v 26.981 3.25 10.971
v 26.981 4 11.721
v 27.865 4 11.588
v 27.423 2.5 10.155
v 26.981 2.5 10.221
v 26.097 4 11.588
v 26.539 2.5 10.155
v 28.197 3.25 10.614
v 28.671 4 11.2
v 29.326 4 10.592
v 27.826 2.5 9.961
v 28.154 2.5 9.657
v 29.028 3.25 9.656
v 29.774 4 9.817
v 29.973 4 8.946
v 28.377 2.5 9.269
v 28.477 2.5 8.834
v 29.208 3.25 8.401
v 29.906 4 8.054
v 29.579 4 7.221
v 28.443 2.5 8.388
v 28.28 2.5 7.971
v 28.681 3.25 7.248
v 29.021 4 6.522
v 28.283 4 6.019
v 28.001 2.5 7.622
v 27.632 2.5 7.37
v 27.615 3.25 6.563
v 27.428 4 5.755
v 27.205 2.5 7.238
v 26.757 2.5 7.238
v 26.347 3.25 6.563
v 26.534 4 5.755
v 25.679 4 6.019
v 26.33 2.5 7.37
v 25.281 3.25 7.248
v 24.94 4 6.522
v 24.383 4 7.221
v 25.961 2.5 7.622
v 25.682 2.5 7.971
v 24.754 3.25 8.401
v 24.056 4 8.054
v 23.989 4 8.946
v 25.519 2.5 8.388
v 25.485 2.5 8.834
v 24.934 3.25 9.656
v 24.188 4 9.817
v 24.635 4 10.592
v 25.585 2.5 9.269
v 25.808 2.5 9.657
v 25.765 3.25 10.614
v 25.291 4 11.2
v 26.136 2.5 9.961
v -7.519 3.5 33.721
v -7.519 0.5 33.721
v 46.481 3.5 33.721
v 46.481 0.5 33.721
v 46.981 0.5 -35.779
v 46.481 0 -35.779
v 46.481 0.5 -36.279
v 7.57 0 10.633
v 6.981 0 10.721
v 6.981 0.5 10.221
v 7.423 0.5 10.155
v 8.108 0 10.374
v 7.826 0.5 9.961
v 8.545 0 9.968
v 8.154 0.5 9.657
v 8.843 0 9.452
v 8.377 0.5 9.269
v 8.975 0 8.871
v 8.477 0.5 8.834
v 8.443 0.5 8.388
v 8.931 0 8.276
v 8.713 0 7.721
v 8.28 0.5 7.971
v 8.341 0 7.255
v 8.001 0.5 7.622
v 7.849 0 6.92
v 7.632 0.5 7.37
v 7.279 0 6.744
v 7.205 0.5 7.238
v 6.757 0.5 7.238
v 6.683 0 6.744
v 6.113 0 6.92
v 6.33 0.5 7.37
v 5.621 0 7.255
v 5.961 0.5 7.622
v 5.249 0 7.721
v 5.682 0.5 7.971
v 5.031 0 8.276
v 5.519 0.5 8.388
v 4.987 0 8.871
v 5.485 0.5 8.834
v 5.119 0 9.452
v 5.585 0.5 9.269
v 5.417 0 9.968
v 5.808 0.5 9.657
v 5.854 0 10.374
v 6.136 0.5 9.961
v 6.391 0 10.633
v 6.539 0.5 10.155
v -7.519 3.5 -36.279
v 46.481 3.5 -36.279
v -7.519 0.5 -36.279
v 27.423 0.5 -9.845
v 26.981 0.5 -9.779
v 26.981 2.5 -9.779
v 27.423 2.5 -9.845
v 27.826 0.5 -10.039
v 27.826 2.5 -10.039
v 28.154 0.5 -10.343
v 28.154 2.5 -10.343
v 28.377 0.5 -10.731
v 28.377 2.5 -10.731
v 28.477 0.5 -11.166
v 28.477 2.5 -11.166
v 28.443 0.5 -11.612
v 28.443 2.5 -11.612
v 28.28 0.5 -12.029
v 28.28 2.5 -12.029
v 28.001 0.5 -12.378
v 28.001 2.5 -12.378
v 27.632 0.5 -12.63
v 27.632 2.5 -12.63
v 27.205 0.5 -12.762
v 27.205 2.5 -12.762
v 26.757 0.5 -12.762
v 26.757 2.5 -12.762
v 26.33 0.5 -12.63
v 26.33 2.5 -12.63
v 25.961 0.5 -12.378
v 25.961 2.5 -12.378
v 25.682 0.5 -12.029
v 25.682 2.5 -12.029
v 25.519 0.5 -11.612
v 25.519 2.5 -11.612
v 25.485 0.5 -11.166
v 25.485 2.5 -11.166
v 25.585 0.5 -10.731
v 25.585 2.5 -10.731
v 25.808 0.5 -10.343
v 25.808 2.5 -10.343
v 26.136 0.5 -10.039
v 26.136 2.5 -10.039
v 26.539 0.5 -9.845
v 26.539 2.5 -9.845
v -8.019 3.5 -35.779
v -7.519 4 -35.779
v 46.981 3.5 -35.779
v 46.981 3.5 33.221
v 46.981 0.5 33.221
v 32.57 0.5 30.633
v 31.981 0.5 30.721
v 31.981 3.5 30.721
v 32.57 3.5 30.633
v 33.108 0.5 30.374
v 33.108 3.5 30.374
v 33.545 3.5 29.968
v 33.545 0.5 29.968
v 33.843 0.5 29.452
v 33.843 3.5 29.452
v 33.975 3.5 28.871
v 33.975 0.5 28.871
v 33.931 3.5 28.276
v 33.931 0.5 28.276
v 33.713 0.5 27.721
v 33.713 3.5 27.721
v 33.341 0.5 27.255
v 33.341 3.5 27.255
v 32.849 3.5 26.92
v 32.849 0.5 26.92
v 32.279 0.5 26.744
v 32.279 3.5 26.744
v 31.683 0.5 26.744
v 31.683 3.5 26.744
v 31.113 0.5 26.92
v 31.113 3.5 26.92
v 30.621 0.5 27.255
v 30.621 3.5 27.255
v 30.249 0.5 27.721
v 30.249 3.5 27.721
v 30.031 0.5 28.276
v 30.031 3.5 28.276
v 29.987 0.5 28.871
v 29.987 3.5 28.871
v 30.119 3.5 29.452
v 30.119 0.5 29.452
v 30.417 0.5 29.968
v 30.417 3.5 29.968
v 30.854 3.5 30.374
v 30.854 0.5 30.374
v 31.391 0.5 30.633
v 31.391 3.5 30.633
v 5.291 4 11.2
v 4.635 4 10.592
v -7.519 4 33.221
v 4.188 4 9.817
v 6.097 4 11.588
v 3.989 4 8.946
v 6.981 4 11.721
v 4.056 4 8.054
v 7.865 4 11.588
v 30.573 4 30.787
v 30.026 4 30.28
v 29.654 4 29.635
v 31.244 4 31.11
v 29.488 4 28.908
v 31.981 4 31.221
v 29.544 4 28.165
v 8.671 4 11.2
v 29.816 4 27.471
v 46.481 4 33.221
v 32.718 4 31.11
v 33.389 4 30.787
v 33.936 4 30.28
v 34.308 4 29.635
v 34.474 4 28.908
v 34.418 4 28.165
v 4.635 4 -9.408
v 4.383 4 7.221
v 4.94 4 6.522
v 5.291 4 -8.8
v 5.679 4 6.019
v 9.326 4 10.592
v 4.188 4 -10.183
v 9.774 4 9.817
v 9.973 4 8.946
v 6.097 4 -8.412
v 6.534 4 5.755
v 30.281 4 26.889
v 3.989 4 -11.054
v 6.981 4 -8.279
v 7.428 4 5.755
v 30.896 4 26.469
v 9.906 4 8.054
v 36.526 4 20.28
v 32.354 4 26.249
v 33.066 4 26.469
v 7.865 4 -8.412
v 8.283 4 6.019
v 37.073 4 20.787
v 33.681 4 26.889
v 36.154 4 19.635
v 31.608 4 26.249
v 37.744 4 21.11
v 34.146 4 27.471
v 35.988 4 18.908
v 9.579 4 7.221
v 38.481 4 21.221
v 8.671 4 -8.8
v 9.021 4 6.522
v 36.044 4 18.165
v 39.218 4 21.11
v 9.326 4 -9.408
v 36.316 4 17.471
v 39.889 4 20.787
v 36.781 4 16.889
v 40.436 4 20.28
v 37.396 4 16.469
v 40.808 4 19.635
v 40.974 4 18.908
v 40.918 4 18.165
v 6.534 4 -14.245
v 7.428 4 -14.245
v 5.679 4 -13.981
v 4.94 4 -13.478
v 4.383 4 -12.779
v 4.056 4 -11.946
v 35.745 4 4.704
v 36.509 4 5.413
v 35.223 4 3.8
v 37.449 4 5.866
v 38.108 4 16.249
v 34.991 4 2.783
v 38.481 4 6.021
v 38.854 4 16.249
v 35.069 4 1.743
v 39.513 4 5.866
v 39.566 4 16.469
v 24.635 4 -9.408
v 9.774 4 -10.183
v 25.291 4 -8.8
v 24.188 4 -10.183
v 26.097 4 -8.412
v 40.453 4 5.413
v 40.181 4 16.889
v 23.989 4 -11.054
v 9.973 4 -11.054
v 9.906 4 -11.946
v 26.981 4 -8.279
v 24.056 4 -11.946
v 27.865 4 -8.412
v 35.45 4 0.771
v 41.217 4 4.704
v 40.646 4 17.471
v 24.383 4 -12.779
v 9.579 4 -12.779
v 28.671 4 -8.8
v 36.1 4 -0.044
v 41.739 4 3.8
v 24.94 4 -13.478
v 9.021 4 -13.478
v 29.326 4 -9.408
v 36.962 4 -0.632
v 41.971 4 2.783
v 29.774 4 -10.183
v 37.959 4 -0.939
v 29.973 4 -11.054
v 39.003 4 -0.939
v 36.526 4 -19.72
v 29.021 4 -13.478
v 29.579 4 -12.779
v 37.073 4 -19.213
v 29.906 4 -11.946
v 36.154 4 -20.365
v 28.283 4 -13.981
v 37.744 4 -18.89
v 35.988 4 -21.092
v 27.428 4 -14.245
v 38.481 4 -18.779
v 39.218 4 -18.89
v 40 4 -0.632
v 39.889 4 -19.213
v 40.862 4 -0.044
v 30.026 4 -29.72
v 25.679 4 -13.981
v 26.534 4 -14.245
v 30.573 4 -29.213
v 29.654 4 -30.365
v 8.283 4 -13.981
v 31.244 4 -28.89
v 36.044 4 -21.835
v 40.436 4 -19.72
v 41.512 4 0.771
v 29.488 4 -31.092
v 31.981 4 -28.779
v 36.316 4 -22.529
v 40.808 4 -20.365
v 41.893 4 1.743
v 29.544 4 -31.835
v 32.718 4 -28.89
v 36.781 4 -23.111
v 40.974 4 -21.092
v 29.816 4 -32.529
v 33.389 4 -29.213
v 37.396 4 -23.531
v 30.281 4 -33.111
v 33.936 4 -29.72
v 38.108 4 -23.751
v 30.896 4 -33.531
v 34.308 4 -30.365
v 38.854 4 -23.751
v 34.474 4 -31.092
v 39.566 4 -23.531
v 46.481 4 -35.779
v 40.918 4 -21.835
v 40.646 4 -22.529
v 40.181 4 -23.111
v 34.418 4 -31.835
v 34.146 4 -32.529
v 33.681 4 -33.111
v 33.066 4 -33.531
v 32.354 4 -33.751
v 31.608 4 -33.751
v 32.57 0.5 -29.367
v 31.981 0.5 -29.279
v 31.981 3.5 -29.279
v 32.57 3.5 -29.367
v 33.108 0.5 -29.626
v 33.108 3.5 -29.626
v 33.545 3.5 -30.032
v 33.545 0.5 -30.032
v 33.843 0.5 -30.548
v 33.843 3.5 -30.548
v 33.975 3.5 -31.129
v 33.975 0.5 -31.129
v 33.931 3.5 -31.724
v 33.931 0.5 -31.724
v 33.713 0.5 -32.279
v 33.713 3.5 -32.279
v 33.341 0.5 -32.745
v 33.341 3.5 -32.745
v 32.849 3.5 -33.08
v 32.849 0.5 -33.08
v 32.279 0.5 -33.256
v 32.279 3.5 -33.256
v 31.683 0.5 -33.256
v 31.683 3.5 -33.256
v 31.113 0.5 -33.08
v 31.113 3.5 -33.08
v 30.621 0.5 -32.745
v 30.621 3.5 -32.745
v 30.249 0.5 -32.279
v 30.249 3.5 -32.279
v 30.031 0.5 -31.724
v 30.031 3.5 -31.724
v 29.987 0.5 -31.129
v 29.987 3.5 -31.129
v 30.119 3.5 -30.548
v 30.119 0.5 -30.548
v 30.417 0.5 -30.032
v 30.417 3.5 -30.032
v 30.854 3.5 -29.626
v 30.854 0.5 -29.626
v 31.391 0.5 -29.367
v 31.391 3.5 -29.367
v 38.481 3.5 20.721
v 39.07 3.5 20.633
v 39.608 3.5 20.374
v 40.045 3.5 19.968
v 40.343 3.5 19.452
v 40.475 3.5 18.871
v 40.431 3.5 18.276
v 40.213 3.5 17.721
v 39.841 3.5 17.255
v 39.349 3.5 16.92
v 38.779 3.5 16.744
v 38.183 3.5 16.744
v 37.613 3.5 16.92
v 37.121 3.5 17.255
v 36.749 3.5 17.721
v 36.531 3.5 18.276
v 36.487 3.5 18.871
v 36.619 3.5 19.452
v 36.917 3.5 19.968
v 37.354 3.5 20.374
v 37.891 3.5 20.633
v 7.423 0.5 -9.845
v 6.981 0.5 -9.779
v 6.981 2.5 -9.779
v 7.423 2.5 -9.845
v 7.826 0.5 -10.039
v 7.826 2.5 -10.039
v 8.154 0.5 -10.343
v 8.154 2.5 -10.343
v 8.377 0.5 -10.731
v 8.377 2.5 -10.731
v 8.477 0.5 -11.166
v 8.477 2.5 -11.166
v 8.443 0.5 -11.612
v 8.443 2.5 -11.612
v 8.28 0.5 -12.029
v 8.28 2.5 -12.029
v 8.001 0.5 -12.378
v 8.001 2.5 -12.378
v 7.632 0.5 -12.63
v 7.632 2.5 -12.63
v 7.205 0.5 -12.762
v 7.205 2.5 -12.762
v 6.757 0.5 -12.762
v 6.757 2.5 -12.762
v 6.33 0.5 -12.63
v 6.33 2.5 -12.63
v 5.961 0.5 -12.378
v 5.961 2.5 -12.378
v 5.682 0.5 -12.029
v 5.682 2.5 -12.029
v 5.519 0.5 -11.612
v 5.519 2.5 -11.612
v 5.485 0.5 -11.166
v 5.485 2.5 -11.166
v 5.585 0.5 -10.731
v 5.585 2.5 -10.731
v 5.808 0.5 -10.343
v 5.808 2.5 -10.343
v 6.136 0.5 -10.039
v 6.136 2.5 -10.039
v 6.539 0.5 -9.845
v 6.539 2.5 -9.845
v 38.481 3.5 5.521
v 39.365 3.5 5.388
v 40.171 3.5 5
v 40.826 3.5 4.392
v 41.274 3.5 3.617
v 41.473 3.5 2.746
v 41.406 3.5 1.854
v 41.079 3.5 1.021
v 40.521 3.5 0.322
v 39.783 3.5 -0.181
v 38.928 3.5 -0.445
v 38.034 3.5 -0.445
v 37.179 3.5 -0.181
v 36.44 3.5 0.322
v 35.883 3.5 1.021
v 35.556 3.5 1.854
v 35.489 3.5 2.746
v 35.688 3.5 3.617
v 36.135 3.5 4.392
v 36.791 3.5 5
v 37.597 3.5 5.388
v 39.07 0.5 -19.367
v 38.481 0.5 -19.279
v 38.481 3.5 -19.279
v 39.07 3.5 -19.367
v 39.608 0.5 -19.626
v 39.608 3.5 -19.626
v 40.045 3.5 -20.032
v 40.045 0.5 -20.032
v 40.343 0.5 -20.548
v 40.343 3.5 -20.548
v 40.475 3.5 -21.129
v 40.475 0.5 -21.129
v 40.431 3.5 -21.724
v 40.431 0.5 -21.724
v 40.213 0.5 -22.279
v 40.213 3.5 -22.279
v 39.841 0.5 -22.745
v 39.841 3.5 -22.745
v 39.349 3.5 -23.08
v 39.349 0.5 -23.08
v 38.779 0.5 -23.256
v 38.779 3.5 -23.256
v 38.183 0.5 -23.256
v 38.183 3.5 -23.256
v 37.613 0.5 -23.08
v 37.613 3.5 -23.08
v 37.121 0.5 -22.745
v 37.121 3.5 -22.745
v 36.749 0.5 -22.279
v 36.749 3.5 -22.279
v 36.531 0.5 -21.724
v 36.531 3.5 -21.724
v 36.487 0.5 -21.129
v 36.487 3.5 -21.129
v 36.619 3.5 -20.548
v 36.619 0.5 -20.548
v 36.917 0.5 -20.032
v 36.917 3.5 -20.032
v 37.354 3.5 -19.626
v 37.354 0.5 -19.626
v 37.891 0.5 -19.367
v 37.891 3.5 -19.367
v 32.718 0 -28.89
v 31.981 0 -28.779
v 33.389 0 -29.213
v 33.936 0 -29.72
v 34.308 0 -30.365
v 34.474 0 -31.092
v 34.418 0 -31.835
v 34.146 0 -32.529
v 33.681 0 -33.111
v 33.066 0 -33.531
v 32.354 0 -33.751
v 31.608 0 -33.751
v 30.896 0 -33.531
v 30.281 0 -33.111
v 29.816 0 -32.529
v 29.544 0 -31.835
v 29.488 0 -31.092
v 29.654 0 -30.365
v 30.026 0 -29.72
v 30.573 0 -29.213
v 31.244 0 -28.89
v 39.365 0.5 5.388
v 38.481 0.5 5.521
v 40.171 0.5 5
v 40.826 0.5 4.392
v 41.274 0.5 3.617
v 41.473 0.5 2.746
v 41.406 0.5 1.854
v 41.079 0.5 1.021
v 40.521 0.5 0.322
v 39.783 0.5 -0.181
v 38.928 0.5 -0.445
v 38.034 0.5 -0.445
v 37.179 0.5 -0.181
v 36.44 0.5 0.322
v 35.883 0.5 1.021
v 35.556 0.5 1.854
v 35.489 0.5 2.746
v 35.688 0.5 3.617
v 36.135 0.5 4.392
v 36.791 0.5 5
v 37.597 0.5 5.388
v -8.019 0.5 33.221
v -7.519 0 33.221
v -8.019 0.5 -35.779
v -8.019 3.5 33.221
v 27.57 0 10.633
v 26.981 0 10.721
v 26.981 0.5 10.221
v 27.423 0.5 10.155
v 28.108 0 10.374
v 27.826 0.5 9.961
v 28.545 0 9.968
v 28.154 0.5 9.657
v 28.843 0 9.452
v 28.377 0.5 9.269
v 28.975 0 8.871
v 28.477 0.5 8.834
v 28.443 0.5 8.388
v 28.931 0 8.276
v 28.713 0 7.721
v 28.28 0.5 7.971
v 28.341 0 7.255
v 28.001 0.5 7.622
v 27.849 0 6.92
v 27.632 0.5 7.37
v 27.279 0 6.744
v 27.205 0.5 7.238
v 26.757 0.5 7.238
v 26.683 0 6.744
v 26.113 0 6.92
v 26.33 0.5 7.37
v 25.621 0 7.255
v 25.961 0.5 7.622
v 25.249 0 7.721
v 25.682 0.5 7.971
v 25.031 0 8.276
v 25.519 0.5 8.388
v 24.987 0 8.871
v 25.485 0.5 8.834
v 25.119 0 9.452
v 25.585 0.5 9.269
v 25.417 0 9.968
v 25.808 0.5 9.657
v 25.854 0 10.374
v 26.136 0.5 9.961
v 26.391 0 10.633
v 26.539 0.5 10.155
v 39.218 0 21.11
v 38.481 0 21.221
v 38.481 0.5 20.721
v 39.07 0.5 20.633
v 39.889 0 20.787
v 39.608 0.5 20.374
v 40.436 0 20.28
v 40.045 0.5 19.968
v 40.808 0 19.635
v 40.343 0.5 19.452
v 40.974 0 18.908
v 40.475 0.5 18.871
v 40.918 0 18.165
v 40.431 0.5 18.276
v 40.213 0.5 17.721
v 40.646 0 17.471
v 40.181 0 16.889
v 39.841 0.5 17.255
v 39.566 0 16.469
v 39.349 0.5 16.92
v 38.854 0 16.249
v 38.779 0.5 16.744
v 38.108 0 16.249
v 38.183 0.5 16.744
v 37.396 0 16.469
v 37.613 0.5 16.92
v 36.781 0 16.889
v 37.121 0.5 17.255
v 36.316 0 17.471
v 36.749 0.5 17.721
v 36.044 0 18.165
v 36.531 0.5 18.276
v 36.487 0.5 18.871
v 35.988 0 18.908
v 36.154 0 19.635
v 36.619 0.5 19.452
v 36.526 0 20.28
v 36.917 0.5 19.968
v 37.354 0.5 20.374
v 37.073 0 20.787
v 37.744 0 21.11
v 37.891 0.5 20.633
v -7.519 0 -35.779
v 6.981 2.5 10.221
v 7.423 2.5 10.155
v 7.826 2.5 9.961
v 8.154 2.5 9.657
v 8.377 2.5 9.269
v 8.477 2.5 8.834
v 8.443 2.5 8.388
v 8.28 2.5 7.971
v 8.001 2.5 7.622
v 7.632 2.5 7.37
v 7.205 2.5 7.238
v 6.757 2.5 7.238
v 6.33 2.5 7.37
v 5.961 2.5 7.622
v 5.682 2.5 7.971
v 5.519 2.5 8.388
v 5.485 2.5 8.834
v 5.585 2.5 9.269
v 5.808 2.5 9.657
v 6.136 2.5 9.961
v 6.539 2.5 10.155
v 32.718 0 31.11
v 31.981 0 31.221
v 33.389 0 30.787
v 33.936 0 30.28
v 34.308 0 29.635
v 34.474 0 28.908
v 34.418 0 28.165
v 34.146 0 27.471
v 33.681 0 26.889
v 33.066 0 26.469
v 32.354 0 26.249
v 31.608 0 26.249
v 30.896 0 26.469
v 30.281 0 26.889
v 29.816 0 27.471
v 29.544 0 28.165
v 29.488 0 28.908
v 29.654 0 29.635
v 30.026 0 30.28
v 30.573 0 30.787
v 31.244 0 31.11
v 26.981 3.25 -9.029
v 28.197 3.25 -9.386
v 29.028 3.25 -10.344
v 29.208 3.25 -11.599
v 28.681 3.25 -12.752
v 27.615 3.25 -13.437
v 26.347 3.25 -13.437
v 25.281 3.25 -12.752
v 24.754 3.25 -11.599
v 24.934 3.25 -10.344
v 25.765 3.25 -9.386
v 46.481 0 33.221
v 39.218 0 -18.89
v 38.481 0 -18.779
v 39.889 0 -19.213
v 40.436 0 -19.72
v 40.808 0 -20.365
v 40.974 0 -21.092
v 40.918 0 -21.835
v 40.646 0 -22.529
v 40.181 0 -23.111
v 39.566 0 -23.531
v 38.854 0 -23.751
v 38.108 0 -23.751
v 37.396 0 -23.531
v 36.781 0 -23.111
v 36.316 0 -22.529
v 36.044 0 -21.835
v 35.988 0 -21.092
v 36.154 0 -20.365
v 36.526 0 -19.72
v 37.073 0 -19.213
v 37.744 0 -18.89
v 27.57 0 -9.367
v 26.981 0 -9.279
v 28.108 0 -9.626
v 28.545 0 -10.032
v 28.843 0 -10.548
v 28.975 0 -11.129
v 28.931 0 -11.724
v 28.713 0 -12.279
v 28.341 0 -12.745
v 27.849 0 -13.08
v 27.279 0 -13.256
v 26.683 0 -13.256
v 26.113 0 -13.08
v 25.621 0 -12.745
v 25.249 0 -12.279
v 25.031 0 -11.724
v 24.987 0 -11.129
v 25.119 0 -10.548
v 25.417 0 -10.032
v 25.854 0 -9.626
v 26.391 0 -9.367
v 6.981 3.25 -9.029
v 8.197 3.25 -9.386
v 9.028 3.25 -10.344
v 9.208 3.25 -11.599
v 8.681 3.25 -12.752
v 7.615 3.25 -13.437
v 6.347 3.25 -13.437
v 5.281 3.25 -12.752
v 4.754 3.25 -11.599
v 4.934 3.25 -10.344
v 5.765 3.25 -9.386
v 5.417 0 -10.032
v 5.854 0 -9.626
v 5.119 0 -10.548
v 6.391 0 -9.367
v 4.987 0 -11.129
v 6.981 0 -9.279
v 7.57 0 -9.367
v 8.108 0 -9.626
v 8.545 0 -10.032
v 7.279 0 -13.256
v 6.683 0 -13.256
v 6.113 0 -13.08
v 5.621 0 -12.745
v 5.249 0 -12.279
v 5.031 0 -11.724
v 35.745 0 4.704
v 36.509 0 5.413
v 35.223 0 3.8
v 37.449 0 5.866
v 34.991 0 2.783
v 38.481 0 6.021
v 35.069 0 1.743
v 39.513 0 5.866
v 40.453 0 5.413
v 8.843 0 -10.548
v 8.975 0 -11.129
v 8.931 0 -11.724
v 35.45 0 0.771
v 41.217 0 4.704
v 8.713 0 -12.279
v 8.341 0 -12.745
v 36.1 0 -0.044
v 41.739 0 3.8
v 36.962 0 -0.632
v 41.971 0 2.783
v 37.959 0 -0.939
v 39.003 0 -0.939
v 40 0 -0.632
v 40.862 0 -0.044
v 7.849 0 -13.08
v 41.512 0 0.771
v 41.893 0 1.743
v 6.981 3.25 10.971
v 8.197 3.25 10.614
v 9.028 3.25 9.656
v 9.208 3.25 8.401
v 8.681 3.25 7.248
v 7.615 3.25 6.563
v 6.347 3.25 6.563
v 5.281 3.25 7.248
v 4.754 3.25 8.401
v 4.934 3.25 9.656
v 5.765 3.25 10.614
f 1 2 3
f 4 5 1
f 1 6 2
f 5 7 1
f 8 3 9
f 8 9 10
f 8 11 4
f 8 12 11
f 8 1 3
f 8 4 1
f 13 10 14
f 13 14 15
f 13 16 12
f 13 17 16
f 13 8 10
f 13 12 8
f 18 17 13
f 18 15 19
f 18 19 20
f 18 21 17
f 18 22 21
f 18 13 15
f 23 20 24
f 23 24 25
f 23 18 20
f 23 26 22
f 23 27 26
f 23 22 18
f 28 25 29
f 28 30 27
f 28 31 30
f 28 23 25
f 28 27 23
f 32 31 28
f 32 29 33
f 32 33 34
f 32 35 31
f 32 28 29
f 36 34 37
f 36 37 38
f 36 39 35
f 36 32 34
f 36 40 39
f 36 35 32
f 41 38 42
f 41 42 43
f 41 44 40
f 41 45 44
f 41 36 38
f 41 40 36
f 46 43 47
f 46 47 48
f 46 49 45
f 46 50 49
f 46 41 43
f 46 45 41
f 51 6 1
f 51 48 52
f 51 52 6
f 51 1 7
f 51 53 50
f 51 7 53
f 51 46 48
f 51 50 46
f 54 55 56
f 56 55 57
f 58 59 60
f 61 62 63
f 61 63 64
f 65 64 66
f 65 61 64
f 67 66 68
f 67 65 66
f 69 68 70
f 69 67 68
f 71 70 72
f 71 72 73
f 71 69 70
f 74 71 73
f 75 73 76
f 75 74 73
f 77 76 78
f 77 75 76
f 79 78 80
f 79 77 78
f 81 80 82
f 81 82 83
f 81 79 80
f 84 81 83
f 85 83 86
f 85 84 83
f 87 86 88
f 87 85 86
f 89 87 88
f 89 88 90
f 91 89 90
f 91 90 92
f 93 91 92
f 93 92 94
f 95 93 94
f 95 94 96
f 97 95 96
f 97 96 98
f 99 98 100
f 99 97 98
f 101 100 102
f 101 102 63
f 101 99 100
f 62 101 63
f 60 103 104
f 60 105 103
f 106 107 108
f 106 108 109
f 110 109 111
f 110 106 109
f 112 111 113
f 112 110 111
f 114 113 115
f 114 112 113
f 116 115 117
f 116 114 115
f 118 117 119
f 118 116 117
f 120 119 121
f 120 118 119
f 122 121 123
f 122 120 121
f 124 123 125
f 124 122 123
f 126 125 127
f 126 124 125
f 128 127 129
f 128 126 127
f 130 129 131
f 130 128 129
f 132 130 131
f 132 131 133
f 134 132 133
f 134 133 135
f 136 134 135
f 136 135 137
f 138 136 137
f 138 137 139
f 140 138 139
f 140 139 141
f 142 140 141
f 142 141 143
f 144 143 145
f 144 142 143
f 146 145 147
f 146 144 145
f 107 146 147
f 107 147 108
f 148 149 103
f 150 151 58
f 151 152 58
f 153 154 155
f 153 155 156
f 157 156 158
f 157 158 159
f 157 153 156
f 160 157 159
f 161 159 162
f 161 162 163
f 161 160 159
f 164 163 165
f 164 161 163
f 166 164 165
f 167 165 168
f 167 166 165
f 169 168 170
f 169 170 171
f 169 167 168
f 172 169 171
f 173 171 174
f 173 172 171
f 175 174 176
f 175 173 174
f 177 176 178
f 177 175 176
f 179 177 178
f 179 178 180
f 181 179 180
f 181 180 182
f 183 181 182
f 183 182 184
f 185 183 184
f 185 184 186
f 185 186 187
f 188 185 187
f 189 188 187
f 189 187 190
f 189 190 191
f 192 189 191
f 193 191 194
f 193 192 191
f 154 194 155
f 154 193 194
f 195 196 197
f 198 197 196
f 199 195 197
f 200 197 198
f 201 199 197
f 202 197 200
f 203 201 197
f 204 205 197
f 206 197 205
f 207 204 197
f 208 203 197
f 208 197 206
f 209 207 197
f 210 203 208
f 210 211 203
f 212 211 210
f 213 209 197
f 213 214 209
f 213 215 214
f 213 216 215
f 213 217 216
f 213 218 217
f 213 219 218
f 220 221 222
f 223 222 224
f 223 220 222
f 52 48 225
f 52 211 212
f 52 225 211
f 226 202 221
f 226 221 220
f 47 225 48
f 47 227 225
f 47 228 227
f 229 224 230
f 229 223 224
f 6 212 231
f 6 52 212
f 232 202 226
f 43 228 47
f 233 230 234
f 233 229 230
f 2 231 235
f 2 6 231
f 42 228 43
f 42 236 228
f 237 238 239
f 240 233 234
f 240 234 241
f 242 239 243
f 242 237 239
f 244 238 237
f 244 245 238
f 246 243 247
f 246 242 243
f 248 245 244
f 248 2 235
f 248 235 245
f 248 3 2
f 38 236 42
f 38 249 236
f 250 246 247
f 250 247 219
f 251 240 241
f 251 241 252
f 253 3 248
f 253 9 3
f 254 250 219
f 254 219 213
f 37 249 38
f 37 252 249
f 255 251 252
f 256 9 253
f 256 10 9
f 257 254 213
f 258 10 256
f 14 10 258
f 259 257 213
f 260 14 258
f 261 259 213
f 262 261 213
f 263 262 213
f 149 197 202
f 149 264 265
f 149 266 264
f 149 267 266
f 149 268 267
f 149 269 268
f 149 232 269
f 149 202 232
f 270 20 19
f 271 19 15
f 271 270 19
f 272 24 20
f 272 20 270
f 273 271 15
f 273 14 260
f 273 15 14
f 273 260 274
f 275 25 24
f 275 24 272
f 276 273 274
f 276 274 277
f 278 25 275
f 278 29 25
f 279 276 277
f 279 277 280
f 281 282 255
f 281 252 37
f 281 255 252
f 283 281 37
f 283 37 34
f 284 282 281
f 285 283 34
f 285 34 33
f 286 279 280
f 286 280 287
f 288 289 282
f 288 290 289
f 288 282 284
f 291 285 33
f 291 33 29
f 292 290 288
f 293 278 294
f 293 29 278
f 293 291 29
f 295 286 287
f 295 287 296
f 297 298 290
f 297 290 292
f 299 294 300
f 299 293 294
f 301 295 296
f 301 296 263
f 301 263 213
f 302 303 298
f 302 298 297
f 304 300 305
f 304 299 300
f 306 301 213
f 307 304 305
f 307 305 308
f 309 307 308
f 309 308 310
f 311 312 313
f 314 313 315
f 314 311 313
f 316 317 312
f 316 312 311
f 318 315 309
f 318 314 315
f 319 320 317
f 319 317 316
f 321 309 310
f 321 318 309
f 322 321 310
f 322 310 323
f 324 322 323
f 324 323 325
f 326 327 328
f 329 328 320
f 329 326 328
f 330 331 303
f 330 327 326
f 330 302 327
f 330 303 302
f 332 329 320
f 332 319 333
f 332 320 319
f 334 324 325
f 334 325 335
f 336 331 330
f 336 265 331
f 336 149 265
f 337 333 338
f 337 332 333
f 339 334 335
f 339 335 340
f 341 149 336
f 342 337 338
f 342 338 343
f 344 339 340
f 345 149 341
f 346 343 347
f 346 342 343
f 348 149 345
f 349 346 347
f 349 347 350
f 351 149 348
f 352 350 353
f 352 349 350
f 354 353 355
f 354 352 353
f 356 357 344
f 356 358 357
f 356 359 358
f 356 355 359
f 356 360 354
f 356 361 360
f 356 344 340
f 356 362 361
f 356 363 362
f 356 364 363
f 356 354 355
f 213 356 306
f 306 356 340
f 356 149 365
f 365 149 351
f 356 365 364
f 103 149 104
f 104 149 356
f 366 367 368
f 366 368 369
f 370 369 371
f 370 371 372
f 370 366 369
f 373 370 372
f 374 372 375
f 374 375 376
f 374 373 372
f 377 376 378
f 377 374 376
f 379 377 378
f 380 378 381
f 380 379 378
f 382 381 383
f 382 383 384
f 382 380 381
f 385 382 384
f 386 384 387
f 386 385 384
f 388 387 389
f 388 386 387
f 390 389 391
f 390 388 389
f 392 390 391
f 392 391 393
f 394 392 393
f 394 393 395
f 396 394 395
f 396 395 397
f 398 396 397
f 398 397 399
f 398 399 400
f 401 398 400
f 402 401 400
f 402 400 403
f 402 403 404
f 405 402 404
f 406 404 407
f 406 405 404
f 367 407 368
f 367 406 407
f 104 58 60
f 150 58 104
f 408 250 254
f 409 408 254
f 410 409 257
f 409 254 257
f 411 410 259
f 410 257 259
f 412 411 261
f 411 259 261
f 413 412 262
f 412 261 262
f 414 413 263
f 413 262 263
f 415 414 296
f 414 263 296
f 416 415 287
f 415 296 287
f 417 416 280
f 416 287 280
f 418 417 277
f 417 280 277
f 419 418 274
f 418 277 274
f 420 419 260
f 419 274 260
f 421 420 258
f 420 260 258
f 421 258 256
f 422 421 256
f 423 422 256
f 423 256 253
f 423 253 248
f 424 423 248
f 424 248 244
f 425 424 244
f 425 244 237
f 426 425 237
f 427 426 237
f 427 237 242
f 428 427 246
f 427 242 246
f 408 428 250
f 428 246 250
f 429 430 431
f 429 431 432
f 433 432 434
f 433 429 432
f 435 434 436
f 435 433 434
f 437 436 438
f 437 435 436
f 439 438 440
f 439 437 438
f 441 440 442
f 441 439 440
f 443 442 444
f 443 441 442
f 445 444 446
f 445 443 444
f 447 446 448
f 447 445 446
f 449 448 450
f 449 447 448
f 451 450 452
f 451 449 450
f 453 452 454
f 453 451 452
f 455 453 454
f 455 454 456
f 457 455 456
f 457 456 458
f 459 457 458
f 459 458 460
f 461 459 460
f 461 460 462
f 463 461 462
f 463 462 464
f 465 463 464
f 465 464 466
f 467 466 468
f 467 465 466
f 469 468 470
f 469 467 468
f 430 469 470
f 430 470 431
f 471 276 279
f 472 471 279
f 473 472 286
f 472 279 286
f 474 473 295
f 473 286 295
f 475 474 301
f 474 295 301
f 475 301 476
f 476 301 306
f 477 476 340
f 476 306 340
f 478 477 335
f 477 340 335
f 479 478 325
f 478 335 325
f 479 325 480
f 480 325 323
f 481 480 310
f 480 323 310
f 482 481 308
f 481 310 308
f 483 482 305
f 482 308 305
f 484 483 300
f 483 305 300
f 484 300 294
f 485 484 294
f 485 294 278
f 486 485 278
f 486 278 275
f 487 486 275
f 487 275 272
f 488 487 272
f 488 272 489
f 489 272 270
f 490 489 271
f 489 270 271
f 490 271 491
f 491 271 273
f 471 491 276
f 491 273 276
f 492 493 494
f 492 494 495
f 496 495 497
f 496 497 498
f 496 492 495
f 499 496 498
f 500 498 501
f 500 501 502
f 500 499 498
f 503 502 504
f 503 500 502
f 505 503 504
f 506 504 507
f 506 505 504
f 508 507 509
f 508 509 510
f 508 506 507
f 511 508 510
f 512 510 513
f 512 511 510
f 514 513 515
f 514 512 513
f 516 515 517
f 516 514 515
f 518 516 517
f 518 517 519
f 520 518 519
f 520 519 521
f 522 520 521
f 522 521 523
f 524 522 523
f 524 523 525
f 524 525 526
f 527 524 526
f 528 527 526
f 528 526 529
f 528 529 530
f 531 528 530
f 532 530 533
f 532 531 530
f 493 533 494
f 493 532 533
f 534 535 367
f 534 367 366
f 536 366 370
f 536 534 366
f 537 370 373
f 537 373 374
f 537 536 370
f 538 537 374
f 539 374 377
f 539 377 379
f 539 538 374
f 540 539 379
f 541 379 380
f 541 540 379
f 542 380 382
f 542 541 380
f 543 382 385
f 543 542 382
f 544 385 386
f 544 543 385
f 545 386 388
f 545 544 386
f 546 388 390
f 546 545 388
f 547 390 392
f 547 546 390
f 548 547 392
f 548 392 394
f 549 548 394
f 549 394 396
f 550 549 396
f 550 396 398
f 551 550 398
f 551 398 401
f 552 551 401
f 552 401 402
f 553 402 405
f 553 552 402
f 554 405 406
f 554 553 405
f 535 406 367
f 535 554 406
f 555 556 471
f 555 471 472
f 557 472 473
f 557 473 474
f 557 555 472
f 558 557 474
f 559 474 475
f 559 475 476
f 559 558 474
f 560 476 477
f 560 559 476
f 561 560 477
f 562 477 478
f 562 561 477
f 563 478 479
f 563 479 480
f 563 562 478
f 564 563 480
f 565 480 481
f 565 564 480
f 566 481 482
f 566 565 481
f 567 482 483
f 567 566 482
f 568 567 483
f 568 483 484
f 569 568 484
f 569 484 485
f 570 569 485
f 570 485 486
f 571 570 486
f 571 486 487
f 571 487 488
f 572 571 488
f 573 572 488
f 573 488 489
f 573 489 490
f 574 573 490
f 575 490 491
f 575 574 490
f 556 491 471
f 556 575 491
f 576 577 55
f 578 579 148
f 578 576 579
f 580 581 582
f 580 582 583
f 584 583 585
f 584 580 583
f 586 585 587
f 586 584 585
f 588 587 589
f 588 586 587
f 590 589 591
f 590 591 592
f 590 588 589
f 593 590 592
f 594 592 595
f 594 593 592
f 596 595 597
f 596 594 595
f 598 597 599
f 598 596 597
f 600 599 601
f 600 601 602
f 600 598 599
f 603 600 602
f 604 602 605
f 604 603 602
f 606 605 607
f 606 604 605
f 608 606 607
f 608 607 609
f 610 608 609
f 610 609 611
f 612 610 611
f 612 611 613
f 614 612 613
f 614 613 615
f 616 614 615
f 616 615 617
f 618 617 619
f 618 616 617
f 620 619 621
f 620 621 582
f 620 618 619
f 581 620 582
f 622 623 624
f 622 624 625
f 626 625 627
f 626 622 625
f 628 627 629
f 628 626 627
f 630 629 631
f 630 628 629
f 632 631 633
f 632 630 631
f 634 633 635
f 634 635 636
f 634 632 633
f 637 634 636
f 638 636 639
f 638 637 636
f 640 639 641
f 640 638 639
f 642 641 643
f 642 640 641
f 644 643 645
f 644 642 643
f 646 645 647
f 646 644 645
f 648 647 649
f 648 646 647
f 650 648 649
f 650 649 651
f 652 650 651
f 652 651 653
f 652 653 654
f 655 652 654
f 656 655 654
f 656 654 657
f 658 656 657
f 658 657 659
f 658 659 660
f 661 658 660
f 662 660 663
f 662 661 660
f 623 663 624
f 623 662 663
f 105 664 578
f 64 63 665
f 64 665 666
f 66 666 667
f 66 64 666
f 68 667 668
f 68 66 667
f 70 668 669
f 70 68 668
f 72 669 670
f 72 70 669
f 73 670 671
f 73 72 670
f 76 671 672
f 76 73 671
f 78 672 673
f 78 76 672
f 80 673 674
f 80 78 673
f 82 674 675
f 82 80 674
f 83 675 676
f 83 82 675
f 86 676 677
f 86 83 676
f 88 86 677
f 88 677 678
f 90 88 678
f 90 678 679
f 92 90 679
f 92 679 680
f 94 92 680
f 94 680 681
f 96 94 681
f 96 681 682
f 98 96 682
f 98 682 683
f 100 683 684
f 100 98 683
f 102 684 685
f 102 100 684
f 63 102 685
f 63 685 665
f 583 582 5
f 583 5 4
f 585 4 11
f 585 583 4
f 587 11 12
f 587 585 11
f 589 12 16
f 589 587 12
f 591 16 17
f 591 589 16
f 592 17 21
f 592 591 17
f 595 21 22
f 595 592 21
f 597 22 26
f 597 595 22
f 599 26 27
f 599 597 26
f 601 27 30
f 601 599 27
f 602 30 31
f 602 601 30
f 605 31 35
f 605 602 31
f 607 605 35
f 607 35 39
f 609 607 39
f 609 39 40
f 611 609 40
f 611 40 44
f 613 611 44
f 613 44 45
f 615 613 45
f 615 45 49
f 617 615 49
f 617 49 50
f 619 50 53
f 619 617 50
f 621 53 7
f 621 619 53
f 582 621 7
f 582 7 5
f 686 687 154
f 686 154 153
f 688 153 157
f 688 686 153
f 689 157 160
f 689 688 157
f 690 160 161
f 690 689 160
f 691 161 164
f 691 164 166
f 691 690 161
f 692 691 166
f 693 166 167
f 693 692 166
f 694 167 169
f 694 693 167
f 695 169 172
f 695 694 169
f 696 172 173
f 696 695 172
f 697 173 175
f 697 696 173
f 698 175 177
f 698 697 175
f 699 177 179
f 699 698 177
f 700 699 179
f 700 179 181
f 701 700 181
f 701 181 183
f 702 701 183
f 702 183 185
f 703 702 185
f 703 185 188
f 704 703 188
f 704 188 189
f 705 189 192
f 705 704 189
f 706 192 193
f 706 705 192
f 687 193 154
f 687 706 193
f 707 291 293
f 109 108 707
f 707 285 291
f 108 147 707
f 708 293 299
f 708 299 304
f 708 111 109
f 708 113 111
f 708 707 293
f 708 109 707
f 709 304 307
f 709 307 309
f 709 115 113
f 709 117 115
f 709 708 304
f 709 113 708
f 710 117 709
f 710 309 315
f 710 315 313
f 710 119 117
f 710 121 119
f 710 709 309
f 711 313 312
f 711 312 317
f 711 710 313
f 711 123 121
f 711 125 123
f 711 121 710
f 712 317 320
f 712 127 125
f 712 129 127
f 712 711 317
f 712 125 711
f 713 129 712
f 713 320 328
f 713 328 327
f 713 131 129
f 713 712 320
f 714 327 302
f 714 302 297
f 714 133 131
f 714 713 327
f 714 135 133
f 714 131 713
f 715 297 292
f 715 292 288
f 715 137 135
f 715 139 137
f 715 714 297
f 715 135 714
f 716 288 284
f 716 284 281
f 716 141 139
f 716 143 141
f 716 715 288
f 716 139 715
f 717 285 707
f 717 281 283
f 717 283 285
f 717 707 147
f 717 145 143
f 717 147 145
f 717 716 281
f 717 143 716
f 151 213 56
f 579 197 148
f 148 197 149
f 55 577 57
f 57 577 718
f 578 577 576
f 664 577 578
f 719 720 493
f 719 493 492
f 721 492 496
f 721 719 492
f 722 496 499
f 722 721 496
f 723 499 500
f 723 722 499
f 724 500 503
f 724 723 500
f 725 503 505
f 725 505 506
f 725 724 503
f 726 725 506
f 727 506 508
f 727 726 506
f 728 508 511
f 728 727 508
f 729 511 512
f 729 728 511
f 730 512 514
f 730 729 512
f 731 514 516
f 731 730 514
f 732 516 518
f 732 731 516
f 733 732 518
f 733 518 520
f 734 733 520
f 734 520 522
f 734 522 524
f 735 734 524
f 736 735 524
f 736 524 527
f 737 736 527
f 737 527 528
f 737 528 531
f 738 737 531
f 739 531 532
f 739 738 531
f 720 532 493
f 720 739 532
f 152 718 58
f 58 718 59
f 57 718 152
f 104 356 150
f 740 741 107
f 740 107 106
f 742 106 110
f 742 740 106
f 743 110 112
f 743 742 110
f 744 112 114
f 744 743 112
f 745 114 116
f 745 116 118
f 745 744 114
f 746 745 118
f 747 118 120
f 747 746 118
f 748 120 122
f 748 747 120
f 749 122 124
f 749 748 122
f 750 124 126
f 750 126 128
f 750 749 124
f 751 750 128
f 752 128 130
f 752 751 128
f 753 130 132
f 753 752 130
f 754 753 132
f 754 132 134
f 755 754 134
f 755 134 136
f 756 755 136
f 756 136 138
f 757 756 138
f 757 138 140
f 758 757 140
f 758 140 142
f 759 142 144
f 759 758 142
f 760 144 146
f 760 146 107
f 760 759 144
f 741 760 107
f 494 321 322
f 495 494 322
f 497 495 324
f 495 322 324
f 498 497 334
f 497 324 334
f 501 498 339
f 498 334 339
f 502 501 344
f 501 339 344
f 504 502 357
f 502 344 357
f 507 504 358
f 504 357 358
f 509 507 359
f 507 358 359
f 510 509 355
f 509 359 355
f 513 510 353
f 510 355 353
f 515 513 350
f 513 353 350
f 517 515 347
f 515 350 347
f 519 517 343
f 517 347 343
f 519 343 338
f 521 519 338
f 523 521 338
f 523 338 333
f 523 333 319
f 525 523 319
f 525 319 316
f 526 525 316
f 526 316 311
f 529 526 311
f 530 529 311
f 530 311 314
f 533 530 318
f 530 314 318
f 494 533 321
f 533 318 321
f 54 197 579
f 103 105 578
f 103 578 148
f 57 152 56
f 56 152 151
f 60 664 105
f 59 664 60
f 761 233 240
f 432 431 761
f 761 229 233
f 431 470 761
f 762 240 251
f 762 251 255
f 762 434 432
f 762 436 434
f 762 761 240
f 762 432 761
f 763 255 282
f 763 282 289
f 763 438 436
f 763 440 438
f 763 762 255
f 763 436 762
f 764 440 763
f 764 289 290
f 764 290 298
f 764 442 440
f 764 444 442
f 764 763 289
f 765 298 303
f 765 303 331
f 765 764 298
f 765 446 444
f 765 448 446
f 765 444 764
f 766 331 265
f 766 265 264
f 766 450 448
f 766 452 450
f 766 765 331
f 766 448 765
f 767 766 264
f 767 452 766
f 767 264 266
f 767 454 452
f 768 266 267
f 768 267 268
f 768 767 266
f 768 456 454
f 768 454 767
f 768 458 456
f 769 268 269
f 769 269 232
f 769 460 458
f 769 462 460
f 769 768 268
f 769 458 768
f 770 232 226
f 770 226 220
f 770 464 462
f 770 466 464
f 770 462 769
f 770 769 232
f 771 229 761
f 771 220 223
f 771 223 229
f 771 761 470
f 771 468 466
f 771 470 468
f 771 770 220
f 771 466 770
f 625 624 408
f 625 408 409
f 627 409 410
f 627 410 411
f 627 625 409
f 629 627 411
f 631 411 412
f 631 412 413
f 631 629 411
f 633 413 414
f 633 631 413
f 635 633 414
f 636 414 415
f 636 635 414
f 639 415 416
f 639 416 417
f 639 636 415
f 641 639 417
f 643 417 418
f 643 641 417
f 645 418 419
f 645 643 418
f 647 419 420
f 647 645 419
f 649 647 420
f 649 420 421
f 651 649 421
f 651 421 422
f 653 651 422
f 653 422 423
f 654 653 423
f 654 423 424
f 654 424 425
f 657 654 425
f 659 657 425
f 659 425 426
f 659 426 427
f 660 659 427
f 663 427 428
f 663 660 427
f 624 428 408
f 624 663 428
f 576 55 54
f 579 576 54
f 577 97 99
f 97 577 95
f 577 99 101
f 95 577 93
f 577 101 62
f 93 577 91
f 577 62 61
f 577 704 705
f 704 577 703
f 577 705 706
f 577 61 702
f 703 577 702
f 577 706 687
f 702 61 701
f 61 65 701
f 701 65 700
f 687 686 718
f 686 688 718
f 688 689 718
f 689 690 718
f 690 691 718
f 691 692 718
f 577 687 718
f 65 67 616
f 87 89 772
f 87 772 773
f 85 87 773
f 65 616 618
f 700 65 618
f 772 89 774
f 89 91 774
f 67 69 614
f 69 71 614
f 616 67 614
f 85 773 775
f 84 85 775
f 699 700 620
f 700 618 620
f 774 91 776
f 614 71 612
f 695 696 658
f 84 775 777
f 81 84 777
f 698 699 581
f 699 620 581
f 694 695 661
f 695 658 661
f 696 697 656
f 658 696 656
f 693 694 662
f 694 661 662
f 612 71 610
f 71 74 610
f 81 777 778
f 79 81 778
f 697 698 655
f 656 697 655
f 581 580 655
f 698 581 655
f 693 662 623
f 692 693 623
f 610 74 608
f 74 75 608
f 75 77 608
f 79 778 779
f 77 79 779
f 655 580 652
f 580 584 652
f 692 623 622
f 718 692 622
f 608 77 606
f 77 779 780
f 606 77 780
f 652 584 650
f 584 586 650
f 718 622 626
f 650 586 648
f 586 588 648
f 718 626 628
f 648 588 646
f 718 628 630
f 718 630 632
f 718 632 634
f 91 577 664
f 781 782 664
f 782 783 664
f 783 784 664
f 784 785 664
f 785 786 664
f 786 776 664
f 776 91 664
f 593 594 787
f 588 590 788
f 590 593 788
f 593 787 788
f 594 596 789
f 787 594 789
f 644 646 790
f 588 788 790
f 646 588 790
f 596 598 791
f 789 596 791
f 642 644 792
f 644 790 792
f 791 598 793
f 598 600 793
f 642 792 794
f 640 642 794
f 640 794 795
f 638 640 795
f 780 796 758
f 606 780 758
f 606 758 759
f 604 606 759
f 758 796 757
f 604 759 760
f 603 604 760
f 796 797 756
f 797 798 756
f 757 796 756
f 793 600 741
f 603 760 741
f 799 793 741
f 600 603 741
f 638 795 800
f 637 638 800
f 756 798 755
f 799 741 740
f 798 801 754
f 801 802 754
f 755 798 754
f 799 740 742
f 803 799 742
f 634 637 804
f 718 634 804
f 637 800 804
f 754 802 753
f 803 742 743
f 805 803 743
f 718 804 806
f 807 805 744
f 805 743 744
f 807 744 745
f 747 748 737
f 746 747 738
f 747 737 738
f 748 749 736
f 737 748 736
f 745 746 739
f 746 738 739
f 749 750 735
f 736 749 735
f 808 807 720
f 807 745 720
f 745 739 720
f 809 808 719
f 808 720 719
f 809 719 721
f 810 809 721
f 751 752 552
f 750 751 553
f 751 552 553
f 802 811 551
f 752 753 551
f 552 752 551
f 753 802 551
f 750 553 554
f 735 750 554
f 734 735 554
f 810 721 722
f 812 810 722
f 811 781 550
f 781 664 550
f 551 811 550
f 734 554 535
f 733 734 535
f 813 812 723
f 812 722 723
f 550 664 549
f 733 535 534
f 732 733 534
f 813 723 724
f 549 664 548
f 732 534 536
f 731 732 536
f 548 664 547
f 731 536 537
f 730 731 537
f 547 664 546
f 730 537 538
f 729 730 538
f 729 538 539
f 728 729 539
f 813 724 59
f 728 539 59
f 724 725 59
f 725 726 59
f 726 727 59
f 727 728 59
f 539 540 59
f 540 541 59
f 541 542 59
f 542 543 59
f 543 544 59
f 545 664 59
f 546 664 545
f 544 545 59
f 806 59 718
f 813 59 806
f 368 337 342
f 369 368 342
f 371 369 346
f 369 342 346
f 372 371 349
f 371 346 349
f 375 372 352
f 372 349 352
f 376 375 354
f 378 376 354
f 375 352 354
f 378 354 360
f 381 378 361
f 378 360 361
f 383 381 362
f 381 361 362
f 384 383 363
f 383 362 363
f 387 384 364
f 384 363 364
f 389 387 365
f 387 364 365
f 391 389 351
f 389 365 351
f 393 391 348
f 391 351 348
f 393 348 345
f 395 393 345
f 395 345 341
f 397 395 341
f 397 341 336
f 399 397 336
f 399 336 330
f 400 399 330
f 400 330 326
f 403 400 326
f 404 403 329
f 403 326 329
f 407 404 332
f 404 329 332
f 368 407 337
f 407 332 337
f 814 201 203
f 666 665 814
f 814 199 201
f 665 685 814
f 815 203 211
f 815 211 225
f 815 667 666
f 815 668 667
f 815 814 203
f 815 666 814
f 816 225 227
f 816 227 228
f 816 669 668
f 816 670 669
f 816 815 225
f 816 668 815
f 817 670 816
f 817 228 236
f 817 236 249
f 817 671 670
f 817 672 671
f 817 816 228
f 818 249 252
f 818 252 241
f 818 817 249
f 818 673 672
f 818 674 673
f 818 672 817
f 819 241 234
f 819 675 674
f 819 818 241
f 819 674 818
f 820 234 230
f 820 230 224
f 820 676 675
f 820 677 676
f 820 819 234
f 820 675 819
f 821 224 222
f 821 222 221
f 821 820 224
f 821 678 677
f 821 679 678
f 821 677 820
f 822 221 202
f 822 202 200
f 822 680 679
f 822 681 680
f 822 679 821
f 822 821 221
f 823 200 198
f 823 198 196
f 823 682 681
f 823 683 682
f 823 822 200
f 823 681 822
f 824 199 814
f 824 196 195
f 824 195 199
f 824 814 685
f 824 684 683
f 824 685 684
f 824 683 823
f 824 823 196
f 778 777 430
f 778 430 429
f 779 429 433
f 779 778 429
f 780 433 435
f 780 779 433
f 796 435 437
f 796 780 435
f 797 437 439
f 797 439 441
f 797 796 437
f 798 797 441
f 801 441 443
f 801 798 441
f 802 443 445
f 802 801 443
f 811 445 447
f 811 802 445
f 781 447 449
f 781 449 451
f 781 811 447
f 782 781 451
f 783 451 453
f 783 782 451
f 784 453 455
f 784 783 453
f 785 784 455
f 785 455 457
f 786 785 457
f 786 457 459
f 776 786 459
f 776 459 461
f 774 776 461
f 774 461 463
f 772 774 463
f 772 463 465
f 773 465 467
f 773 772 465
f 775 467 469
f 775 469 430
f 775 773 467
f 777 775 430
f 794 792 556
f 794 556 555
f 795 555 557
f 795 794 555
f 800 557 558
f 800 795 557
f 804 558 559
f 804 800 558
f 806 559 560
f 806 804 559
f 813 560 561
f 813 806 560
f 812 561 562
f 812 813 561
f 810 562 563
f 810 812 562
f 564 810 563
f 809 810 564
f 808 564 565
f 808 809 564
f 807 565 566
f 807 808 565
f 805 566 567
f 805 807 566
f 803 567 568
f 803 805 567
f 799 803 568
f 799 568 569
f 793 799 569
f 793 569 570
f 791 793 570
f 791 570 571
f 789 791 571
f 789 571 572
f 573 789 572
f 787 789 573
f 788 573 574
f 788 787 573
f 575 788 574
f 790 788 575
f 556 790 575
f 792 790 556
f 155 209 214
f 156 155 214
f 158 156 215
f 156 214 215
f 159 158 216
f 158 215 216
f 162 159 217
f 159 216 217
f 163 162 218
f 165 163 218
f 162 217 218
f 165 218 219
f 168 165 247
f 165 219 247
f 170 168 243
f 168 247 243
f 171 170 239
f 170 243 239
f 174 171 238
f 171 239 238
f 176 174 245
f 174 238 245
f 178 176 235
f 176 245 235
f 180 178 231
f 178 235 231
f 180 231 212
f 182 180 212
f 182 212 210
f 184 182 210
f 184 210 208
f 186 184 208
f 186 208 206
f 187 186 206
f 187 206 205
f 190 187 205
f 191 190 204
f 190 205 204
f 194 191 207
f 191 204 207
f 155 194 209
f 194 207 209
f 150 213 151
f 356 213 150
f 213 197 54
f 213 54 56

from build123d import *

# Parameters (mm, degrees)
CROQUIS1_W              = 55
CROQUIS1_H              = 70
CROQUIS1_R              = 1.5
CROQUIS1_R_2            = 2
CROQUIS1_R_3            = 3
SALIENTE_EXTRUIR1_DEPTH = 4
CHAFL_N1_SIZE           = 0.5
CHAFL_N2_SIZE           = 1.5


with BuildPart() as part:
    # Croquis1 → Saliente-Extruir1 (new body)
    with BuildSketch(Plane(origin=(0, 0, 0), x_dir=(1, 0, 0), z_dir=(0, 1, 0))):
        with Locations((19.480956658, 1.278538813)):
            Rectangle(CROQUIS1_W, CROQUIS1_H)
        with Locations(Location((6.980956658, 11.278538813, 0), (0, 0, 270))):
            Circle(CROQUIS1_R, mode=Mode.SUBTRACT)
        with Locations(Location((26.980956658, 11.278538813, 0), (0, 0, 270))):
            Circle(CROQUIS1_R, mode=Mode.SUBTRACT)
        with Locations(Location((6.980956658, -8.721461187, 0), (0, 0, 270))):
            Circle(CROQUIS1_R, mode=Mode.SUBTRACT)
        with Locations(Location((26.980956658, -8.721461187, 0), (0, 0, 270))):
            Circle(CROQUIS1_R, mode=Mode.SUBTRACT)
        with Locations(Location((31.980956658, 31.278538813, 0), (0, 0, 270))):
            Circle(CROQUIS1_R_2, mode=Mode.SUBTRACT)
        with Locations(Location((31.980956658, -28.721461187, 0), (0, 0, 270))):
            Circle(CROQUIS1_R_2, mode=Mode.SUBTRACT)
        with Locations(Location((38.480956658, -18.721461187, 0), (0, 0, 270))):
            Circle(CROQUIS1_R_2, mode=Mode.SUBTRACT)
        with Locations(Location((38.480956658, -2.521461187, 0), (0, 0, 270))):
            Circle(CROQUIS1_R_3, mode=Mode.SUBTRACT)
        with Locations(Location((38.480956658, 21.278538813, 0), (0, 0, 270))):
            Circle(CROQUIS1_R_2, mode=Mode.SUBTRACT)
    extrude(amount=SALIENTE_EXTRUIR1_DEPTH)

    # Chaflán1
    chafl_n1_edges = [part.edges().sort_by_distance(p)[0] for p in [
        (46.980956658, 4, -1.278538813),
        (6.980956658, 0, -12.778538813),
        (19.480956658, 4, -36.278538813),
        (26.980956658, 0, -12.778538813),
        (6.980956658, 0, 7.221461187),
        (26.980956658, 0, 7.221461187),
        (31.980956658, 0, -33.278538813),
        (31.980956658, 4, -33.278538813),
        (31.980956658, 0, 26.721461187),
        (31.980956658, 4, 26.721461187),
        (38.480956658, 0, 16.721461187),
        (38.480956658, 4, 16.721461187),
        (38.480956658, 0, -0.478538813),
        (38.480956658, 4, -0.478538813),
        (-8.019043342, 4, -1.278538813),
        (38.480956658, 0, -23.278538813),
        (38.480956658, 4, -23.278538813),
        (19.480956658, 0, -36.278538813),
        (46.980956658, 0, -1.278538813),
        (19.480956658, 0, 33.721461187),
        (-8.019043342, 0, -1.278538813),
        (19.480956658, 4, 33.721461187),
        (-8.019043342, 2, -36.278538813),
        (46.980956658, 2, -36.278538813),
        (46.980956658, 2, 33.721461187),
        (-8.019043342, 2, 33.721461187),
    ]]
    chamfer(chafl_n1_edges, length=CHAFL_N1_SIZE)

    # Chaflán2
    chafl_n2_edges = [part.edges().sort_by_distance(p)[0] for p in [
        (6.980956658, 4, -12.778538813),
        (26.980956658, 4, -12.778538813),
        (6.980956658, 4, 7.221461187),
        (26.980956658, 4, 7.221461187),
    ]]
    chamfer(chafl_n2_edges, length=CHAFL_N2_SIZE)


solid = part.part
